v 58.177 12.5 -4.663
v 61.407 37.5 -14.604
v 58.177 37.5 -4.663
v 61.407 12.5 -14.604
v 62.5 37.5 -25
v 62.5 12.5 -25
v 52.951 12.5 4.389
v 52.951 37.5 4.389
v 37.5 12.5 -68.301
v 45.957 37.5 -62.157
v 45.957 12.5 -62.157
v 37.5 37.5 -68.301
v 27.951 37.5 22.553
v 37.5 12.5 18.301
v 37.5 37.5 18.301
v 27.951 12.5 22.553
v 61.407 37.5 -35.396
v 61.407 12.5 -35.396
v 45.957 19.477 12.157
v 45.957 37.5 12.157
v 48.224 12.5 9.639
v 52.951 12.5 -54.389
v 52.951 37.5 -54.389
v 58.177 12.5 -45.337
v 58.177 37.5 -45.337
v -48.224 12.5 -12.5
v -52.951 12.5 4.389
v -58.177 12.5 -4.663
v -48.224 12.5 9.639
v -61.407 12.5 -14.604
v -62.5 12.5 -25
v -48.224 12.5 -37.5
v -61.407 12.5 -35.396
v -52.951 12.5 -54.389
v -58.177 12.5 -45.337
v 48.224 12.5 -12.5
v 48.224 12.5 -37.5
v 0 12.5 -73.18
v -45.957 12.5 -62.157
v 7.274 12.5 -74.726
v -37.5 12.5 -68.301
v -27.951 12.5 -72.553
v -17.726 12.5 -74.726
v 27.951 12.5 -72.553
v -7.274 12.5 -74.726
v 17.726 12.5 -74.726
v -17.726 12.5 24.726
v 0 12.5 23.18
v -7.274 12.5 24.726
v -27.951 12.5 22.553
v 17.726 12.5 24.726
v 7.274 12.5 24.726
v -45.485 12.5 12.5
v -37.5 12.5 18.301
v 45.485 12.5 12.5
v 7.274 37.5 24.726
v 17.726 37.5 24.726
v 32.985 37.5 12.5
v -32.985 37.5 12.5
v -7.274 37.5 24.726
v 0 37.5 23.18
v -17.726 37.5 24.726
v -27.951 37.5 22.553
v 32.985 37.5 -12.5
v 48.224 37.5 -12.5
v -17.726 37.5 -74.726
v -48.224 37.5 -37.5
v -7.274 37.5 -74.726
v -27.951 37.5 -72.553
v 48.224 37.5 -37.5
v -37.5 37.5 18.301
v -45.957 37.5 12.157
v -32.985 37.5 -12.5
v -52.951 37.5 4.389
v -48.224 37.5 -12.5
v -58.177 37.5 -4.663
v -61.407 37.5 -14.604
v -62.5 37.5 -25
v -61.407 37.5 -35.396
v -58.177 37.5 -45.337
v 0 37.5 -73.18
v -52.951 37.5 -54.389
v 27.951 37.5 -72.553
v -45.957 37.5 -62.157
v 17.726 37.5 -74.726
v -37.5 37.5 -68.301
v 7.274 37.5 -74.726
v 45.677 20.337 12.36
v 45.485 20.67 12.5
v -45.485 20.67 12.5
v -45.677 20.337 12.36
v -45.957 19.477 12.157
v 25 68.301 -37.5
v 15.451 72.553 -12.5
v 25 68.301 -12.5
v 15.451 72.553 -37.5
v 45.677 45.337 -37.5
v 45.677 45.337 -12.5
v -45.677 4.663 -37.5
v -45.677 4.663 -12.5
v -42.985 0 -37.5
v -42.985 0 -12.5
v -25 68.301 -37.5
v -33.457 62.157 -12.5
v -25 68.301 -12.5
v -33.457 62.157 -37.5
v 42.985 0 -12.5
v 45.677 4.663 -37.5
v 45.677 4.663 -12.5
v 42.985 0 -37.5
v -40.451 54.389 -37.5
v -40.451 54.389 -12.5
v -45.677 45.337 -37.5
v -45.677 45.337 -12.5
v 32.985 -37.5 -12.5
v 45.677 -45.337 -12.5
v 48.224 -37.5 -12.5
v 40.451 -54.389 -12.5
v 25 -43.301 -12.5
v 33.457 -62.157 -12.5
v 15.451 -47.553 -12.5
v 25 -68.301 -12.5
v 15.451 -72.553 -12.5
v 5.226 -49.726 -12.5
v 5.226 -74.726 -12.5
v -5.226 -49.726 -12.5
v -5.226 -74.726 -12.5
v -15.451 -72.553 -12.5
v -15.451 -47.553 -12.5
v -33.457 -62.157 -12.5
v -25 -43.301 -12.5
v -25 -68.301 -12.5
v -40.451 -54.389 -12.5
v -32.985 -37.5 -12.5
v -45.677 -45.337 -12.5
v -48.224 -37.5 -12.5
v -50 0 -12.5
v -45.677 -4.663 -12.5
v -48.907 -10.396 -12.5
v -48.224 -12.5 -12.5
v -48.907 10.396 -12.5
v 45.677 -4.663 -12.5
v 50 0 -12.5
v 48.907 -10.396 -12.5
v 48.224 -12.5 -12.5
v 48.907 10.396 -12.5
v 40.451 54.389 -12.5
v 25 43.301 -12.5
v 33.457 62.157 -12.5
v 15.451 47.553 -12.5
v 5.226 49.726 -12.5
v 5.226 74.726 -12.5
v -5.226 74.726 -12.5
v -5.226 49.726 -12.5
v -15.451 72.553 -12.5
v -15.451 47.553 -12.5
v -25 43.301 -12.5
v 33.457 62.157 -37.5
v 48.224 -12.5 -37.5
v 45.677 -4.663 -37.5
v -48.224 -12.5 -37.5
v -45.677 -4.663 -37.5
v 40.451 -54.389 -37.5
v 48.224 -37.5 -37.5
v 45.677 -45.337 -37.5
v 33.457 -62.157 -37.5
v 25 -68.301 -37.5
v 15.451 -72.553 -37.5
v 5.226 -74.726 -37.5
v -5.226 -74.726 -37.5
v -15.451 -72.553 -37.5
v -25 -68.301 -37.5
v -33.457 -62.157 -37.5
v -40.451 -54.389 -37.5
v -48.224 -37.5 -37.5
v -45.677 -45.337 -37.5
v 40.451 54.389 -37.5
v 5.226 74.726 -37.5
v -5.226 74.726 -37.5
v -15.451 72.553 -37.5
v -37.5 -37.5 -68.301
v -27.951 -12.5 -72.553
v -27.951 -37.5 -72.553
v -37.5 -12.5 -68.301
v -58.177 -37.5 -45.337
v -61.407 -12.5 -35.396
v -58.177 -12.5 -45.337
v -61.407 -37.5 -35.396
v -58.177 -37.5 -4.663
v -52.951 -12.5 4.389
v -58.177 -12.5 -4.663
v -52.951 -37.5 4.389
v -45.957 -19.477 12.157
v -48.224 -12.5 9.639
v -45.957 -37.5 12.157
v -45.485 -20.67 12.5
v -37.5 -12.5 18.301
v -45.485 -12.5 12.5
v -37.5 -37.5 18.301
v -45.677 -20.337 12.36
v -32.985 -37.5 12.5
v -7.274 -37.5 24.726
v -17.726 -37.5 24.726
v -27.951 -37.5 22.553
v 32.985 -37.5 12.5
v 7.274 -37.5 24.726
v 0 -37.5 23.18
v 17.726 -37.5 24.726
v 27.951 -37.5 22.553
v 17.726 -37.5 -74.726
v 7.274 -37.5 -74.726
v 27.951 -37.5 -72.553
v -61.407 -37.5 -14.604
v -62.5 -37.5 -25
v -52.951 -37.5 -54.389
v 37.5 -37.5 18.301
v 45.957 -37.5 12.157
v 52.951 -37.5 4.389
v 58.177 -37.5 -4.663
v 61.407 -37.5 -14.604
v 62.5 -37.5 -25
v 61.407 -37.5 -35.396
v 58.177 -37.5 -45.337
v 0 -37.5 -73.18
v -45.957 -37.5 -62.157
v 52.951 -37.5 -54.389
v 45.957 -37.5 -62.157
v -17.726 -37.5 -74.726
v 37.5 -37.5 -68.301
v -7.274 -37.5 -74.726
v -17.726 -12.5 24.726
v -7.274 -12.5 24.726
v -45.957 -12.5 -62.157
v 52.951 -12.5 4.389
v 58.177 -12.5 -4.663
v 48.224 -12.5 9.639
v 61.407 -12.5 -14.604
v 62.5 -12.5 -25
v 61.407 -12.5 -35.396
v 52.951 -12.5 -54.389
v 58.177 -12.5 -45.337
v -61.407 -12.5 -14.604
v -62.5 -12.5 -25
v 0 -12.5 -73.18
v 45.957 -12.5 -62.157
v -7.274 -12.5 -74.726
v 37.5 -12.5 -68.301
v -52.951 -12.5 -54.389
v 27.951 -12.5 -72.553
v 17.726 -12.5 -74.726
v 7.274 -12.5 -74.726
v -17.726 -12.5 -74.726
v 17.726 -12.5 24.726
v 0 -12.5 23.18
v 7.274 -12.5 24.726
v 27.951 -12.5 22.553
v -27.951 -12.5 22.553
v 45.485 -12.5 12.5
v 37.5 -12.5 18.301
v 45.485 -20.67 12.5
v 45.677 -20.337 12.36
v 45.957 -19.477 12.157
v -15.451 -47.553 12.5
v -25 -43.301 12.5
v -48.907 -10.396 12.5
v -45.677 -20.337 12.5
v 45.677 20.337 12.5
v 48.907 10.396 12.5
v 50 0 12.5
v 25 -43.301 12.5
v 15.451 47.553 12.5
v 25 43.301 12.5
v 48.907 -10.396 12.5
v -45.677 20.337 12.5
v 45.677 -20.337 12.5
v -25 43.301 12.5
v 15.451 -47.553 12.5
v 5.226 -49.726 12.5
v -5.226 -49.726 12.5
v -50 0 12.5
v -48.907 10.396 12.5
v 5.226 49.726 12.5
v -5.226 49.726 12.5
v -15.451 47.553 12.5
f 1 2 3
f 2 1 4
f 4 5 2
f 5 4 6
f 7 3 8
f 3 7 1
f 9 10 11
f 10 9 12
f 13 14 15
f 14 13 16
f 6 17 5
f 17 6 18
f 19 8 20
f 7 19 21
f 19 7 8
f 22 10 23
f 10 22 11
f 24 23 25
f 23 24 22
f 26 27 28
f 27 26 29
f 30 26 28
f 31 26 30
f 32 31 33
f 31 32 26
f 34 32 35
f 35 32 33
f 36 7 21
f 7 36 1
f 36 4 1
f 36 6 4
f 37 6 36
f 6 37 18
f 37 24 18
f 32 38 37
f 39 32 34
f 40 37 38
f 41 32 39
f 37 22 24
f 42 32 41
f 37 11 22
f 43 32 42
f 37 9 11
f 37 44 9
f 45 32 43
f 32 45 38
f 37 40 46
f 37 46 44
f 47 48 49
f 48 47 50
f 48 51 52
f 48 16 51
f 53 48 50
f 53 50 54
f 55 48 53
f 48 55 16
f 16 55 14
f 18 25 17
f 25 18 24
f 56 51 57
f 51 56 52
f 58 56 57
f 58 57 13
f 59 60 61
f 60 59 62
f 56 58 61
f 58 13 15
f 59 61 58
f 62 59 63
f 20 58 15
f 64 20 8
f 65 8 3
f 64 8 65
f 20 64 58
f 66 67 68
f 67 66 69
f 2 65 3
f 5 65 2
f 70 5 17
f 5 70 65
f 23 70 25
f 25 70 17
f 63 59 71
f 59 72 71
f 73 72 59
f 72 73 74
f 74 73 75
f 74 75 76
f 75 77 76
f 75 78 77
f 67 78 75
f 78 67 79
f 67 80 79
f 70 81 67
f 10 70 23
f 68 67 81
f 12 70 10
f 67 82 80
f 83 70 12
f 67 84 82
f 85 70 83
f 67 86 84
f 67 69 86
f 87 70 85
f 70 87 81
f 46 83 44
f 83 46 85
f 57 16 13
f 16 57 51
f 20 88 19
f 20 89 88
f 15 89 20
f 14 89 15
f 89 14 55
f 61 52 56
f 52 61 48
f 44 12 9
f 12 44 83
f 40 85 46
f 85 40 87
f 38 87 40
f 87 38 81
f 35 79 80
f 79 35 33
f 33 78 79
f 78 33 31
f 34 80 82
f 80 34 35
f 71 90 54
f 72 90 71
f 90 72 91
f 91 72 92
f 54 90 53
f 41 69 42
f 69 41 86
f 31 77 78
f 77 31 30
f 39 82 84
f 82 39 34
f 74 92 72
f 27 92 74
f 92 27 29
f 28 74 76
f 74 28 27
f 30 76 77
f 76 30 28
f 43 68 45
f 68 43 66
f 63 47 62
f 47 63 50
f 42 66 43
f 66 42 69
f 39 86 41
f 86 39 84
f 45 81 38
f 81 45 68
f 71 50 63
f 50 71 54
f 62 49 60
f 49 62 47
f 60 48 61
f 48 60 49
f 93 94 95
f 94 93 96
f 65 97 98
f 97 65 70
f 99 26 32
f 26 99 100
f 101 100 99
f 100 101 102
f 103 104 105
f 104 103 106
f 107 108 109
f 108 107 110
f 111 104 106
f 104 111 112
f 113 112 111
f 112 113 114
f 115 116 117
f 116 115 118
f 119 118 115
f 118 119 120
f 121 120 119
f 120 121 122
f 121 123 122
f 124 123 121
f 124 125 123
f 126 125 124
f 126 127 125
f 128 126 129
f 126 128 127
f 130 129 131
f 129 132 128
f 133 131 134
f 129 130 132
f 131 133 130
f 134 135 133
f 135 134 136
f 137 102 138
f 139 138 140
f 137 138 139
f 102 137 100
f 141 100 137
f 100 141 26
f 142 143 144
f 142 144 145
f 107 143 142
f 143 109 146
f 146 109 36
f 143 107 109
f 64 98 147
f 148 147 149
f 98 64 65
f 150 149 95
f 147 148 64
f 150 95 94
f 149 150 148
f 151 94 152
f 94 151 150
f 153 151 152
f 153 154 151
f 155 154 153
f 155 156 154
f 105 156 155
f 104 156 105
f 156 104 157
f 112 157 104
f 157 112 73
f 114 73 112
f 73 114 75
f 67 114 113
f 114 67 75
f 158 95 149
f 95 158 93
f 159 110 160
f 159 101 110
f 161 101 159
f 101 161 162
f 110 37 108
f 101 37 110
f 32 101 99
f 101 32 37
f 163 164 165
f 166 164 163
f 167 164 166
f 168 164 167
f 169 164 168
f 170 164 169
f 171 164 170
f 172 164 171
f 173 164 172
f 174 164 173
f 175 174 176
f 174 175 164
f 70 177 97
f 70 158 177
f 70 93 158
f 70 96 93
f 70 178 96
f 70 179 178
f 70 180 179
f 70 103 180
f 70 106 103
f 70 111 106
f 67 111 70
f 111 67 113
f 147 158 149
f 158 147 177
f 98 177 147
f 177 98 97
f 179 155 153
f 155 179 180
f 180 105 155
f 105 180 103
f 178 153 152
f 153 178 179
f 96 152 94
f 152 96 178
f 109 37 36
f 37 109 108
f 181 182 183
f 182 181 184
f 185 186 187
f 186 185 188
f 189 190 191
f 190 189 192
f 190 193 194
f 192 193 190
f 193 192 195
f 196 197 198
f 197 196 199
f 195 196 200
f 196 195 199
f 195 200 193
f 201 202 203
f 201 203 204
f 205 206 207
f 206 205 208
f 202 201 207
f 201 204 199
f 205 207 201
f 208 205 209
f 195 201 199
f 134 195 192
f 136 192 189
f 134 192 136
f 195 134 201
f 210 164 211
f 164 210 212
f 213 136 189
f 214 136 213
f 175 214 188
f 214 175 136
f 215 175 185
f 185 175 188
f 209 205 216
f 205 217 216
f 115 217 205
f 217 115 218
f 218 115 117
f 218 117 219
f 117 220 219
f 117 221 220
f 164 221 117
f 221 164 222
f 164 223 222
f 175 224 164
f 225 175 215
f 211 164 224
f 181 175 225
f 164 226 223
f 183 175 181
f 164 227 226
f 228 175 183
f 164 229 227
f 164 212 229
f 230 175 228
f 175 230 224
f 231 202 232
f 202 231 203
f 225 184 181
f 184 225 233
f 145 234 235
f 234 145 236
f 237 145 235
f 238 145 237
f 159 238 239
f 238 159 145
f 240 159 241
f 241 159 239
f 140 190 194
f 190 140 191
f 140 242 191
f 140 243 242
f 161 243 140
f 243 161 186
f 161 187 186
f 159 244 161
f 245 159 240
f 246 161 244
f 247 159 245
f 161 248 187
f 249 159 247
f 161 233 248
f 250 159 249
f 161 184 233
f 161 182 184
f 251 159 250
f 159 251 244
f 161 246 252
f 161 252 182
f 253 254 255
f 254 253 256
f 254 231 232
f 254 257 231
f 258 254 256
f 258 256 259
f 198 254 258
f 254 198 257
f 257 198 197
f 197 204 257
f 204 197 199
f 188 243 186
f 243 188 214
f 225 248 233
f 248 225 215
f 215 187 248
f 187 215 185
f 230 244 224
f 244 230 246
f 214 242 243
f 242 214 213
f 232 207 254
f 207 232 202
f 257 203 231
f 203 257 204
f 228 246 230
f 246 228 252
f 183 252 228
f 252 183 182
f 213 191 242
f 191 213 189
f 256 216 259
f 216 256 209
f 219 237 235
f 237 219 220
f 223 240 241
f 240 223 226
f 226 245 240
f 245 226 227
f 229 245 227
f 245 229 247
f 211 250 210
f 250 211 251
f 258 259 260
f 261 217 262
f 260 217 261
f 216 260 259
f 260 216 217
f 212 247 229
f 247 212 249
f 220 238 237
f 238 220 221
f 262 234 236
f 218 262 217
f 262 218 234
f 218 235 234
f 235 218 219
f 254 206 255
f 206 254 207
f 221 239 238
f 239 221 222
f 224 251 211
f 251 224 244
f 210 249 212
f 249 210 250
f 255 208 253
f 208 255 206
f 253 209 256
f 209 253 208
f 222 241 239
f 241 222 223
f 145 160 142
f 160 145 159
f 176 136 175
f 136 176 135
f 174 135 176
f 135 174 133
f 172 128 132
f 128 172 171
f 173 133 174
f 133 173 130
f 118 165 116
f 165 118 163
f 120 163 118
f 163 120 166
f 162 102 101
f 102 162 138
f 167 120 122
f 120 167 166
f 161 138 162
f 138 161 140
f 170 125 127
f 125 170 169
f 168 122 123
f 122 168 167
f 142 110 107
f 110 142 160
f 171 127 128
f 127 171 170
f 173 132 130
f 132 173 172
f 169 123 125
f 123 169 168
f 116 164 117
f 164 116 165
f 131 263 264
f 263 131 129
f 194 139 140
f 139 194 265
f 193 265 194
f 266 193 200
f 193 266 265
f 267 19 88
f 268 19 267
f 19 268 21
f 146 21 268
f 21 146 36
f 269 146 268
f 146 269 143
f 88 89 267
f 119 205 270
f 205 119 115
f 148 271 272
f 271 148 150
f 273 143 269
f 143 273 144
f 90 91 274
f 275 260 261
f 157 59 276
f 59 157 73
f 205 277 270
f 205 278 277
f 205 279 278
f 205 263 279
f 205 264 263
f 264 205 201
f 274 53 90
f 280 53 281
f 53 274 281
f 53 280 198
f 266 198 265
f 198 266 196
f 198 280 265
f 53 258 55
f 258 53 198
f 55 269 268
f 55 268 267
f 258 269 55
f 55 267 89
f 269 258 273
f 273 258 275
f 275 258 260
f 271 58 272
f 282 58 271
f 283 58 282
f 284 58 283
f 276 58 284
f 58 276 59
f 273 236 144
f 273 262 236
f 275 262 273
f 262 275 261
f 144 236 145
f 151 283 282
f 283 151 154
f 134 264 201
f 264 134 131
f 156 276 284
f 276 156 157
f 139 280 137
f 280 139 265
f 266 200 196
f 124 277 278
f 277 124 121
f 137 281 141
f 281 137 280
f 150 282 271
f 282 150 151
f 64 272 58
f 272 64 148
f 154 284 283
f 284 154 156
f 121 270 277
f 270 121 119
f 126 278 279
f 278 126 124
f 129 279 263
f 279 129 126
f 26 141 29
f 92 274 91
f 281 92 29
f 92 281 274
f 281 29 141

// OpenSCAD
module chair_legs(size) {
    // Create the leg body
    cylinder(d = size*2, h = size/2, center = true);

    // Create the top part of the leg
    cylinder(d = size*1.5, h = size/4, center = true);

    // Create the bottom part of the leg
    cylinder(d = size*0.8, h = size/4, center = true);
}

module chair(size) {
    // Create the base of the chair
    cylinder(d = size*2, h = size/2, center = true);

    // Create the legs of the chair
    translate([size/4, size/2, -size/2]) {
        rotate([90, 0, 0]) {
            chair_legs(size);
        }
    }

    translate([-size/4, size/2, -size/2]) {
        rotate([90, 180, 0]) {
            chair_legs(size);
        }
    }

    translate([0, size/2, -size/2]) {
        rotate([0, 0, 180]) {
            chair_legs(size);
        }
    }

    translate([-size/4, -size/2, -size/2]) {
        rotate([90, 0, 0]) {
            chair_legs(size);
        }
    }

    translate([size/4, -size/2, -size/2]) {
        rotate([90, 180, 0]) {
            chair_legs(size);
        }
    }

    translate([0, -size/2, -size/2]) {
        rotate([0, 0, 180]) {
            chair_legs(size);
        }
    }
}

// Example usage
chair(size=50);
